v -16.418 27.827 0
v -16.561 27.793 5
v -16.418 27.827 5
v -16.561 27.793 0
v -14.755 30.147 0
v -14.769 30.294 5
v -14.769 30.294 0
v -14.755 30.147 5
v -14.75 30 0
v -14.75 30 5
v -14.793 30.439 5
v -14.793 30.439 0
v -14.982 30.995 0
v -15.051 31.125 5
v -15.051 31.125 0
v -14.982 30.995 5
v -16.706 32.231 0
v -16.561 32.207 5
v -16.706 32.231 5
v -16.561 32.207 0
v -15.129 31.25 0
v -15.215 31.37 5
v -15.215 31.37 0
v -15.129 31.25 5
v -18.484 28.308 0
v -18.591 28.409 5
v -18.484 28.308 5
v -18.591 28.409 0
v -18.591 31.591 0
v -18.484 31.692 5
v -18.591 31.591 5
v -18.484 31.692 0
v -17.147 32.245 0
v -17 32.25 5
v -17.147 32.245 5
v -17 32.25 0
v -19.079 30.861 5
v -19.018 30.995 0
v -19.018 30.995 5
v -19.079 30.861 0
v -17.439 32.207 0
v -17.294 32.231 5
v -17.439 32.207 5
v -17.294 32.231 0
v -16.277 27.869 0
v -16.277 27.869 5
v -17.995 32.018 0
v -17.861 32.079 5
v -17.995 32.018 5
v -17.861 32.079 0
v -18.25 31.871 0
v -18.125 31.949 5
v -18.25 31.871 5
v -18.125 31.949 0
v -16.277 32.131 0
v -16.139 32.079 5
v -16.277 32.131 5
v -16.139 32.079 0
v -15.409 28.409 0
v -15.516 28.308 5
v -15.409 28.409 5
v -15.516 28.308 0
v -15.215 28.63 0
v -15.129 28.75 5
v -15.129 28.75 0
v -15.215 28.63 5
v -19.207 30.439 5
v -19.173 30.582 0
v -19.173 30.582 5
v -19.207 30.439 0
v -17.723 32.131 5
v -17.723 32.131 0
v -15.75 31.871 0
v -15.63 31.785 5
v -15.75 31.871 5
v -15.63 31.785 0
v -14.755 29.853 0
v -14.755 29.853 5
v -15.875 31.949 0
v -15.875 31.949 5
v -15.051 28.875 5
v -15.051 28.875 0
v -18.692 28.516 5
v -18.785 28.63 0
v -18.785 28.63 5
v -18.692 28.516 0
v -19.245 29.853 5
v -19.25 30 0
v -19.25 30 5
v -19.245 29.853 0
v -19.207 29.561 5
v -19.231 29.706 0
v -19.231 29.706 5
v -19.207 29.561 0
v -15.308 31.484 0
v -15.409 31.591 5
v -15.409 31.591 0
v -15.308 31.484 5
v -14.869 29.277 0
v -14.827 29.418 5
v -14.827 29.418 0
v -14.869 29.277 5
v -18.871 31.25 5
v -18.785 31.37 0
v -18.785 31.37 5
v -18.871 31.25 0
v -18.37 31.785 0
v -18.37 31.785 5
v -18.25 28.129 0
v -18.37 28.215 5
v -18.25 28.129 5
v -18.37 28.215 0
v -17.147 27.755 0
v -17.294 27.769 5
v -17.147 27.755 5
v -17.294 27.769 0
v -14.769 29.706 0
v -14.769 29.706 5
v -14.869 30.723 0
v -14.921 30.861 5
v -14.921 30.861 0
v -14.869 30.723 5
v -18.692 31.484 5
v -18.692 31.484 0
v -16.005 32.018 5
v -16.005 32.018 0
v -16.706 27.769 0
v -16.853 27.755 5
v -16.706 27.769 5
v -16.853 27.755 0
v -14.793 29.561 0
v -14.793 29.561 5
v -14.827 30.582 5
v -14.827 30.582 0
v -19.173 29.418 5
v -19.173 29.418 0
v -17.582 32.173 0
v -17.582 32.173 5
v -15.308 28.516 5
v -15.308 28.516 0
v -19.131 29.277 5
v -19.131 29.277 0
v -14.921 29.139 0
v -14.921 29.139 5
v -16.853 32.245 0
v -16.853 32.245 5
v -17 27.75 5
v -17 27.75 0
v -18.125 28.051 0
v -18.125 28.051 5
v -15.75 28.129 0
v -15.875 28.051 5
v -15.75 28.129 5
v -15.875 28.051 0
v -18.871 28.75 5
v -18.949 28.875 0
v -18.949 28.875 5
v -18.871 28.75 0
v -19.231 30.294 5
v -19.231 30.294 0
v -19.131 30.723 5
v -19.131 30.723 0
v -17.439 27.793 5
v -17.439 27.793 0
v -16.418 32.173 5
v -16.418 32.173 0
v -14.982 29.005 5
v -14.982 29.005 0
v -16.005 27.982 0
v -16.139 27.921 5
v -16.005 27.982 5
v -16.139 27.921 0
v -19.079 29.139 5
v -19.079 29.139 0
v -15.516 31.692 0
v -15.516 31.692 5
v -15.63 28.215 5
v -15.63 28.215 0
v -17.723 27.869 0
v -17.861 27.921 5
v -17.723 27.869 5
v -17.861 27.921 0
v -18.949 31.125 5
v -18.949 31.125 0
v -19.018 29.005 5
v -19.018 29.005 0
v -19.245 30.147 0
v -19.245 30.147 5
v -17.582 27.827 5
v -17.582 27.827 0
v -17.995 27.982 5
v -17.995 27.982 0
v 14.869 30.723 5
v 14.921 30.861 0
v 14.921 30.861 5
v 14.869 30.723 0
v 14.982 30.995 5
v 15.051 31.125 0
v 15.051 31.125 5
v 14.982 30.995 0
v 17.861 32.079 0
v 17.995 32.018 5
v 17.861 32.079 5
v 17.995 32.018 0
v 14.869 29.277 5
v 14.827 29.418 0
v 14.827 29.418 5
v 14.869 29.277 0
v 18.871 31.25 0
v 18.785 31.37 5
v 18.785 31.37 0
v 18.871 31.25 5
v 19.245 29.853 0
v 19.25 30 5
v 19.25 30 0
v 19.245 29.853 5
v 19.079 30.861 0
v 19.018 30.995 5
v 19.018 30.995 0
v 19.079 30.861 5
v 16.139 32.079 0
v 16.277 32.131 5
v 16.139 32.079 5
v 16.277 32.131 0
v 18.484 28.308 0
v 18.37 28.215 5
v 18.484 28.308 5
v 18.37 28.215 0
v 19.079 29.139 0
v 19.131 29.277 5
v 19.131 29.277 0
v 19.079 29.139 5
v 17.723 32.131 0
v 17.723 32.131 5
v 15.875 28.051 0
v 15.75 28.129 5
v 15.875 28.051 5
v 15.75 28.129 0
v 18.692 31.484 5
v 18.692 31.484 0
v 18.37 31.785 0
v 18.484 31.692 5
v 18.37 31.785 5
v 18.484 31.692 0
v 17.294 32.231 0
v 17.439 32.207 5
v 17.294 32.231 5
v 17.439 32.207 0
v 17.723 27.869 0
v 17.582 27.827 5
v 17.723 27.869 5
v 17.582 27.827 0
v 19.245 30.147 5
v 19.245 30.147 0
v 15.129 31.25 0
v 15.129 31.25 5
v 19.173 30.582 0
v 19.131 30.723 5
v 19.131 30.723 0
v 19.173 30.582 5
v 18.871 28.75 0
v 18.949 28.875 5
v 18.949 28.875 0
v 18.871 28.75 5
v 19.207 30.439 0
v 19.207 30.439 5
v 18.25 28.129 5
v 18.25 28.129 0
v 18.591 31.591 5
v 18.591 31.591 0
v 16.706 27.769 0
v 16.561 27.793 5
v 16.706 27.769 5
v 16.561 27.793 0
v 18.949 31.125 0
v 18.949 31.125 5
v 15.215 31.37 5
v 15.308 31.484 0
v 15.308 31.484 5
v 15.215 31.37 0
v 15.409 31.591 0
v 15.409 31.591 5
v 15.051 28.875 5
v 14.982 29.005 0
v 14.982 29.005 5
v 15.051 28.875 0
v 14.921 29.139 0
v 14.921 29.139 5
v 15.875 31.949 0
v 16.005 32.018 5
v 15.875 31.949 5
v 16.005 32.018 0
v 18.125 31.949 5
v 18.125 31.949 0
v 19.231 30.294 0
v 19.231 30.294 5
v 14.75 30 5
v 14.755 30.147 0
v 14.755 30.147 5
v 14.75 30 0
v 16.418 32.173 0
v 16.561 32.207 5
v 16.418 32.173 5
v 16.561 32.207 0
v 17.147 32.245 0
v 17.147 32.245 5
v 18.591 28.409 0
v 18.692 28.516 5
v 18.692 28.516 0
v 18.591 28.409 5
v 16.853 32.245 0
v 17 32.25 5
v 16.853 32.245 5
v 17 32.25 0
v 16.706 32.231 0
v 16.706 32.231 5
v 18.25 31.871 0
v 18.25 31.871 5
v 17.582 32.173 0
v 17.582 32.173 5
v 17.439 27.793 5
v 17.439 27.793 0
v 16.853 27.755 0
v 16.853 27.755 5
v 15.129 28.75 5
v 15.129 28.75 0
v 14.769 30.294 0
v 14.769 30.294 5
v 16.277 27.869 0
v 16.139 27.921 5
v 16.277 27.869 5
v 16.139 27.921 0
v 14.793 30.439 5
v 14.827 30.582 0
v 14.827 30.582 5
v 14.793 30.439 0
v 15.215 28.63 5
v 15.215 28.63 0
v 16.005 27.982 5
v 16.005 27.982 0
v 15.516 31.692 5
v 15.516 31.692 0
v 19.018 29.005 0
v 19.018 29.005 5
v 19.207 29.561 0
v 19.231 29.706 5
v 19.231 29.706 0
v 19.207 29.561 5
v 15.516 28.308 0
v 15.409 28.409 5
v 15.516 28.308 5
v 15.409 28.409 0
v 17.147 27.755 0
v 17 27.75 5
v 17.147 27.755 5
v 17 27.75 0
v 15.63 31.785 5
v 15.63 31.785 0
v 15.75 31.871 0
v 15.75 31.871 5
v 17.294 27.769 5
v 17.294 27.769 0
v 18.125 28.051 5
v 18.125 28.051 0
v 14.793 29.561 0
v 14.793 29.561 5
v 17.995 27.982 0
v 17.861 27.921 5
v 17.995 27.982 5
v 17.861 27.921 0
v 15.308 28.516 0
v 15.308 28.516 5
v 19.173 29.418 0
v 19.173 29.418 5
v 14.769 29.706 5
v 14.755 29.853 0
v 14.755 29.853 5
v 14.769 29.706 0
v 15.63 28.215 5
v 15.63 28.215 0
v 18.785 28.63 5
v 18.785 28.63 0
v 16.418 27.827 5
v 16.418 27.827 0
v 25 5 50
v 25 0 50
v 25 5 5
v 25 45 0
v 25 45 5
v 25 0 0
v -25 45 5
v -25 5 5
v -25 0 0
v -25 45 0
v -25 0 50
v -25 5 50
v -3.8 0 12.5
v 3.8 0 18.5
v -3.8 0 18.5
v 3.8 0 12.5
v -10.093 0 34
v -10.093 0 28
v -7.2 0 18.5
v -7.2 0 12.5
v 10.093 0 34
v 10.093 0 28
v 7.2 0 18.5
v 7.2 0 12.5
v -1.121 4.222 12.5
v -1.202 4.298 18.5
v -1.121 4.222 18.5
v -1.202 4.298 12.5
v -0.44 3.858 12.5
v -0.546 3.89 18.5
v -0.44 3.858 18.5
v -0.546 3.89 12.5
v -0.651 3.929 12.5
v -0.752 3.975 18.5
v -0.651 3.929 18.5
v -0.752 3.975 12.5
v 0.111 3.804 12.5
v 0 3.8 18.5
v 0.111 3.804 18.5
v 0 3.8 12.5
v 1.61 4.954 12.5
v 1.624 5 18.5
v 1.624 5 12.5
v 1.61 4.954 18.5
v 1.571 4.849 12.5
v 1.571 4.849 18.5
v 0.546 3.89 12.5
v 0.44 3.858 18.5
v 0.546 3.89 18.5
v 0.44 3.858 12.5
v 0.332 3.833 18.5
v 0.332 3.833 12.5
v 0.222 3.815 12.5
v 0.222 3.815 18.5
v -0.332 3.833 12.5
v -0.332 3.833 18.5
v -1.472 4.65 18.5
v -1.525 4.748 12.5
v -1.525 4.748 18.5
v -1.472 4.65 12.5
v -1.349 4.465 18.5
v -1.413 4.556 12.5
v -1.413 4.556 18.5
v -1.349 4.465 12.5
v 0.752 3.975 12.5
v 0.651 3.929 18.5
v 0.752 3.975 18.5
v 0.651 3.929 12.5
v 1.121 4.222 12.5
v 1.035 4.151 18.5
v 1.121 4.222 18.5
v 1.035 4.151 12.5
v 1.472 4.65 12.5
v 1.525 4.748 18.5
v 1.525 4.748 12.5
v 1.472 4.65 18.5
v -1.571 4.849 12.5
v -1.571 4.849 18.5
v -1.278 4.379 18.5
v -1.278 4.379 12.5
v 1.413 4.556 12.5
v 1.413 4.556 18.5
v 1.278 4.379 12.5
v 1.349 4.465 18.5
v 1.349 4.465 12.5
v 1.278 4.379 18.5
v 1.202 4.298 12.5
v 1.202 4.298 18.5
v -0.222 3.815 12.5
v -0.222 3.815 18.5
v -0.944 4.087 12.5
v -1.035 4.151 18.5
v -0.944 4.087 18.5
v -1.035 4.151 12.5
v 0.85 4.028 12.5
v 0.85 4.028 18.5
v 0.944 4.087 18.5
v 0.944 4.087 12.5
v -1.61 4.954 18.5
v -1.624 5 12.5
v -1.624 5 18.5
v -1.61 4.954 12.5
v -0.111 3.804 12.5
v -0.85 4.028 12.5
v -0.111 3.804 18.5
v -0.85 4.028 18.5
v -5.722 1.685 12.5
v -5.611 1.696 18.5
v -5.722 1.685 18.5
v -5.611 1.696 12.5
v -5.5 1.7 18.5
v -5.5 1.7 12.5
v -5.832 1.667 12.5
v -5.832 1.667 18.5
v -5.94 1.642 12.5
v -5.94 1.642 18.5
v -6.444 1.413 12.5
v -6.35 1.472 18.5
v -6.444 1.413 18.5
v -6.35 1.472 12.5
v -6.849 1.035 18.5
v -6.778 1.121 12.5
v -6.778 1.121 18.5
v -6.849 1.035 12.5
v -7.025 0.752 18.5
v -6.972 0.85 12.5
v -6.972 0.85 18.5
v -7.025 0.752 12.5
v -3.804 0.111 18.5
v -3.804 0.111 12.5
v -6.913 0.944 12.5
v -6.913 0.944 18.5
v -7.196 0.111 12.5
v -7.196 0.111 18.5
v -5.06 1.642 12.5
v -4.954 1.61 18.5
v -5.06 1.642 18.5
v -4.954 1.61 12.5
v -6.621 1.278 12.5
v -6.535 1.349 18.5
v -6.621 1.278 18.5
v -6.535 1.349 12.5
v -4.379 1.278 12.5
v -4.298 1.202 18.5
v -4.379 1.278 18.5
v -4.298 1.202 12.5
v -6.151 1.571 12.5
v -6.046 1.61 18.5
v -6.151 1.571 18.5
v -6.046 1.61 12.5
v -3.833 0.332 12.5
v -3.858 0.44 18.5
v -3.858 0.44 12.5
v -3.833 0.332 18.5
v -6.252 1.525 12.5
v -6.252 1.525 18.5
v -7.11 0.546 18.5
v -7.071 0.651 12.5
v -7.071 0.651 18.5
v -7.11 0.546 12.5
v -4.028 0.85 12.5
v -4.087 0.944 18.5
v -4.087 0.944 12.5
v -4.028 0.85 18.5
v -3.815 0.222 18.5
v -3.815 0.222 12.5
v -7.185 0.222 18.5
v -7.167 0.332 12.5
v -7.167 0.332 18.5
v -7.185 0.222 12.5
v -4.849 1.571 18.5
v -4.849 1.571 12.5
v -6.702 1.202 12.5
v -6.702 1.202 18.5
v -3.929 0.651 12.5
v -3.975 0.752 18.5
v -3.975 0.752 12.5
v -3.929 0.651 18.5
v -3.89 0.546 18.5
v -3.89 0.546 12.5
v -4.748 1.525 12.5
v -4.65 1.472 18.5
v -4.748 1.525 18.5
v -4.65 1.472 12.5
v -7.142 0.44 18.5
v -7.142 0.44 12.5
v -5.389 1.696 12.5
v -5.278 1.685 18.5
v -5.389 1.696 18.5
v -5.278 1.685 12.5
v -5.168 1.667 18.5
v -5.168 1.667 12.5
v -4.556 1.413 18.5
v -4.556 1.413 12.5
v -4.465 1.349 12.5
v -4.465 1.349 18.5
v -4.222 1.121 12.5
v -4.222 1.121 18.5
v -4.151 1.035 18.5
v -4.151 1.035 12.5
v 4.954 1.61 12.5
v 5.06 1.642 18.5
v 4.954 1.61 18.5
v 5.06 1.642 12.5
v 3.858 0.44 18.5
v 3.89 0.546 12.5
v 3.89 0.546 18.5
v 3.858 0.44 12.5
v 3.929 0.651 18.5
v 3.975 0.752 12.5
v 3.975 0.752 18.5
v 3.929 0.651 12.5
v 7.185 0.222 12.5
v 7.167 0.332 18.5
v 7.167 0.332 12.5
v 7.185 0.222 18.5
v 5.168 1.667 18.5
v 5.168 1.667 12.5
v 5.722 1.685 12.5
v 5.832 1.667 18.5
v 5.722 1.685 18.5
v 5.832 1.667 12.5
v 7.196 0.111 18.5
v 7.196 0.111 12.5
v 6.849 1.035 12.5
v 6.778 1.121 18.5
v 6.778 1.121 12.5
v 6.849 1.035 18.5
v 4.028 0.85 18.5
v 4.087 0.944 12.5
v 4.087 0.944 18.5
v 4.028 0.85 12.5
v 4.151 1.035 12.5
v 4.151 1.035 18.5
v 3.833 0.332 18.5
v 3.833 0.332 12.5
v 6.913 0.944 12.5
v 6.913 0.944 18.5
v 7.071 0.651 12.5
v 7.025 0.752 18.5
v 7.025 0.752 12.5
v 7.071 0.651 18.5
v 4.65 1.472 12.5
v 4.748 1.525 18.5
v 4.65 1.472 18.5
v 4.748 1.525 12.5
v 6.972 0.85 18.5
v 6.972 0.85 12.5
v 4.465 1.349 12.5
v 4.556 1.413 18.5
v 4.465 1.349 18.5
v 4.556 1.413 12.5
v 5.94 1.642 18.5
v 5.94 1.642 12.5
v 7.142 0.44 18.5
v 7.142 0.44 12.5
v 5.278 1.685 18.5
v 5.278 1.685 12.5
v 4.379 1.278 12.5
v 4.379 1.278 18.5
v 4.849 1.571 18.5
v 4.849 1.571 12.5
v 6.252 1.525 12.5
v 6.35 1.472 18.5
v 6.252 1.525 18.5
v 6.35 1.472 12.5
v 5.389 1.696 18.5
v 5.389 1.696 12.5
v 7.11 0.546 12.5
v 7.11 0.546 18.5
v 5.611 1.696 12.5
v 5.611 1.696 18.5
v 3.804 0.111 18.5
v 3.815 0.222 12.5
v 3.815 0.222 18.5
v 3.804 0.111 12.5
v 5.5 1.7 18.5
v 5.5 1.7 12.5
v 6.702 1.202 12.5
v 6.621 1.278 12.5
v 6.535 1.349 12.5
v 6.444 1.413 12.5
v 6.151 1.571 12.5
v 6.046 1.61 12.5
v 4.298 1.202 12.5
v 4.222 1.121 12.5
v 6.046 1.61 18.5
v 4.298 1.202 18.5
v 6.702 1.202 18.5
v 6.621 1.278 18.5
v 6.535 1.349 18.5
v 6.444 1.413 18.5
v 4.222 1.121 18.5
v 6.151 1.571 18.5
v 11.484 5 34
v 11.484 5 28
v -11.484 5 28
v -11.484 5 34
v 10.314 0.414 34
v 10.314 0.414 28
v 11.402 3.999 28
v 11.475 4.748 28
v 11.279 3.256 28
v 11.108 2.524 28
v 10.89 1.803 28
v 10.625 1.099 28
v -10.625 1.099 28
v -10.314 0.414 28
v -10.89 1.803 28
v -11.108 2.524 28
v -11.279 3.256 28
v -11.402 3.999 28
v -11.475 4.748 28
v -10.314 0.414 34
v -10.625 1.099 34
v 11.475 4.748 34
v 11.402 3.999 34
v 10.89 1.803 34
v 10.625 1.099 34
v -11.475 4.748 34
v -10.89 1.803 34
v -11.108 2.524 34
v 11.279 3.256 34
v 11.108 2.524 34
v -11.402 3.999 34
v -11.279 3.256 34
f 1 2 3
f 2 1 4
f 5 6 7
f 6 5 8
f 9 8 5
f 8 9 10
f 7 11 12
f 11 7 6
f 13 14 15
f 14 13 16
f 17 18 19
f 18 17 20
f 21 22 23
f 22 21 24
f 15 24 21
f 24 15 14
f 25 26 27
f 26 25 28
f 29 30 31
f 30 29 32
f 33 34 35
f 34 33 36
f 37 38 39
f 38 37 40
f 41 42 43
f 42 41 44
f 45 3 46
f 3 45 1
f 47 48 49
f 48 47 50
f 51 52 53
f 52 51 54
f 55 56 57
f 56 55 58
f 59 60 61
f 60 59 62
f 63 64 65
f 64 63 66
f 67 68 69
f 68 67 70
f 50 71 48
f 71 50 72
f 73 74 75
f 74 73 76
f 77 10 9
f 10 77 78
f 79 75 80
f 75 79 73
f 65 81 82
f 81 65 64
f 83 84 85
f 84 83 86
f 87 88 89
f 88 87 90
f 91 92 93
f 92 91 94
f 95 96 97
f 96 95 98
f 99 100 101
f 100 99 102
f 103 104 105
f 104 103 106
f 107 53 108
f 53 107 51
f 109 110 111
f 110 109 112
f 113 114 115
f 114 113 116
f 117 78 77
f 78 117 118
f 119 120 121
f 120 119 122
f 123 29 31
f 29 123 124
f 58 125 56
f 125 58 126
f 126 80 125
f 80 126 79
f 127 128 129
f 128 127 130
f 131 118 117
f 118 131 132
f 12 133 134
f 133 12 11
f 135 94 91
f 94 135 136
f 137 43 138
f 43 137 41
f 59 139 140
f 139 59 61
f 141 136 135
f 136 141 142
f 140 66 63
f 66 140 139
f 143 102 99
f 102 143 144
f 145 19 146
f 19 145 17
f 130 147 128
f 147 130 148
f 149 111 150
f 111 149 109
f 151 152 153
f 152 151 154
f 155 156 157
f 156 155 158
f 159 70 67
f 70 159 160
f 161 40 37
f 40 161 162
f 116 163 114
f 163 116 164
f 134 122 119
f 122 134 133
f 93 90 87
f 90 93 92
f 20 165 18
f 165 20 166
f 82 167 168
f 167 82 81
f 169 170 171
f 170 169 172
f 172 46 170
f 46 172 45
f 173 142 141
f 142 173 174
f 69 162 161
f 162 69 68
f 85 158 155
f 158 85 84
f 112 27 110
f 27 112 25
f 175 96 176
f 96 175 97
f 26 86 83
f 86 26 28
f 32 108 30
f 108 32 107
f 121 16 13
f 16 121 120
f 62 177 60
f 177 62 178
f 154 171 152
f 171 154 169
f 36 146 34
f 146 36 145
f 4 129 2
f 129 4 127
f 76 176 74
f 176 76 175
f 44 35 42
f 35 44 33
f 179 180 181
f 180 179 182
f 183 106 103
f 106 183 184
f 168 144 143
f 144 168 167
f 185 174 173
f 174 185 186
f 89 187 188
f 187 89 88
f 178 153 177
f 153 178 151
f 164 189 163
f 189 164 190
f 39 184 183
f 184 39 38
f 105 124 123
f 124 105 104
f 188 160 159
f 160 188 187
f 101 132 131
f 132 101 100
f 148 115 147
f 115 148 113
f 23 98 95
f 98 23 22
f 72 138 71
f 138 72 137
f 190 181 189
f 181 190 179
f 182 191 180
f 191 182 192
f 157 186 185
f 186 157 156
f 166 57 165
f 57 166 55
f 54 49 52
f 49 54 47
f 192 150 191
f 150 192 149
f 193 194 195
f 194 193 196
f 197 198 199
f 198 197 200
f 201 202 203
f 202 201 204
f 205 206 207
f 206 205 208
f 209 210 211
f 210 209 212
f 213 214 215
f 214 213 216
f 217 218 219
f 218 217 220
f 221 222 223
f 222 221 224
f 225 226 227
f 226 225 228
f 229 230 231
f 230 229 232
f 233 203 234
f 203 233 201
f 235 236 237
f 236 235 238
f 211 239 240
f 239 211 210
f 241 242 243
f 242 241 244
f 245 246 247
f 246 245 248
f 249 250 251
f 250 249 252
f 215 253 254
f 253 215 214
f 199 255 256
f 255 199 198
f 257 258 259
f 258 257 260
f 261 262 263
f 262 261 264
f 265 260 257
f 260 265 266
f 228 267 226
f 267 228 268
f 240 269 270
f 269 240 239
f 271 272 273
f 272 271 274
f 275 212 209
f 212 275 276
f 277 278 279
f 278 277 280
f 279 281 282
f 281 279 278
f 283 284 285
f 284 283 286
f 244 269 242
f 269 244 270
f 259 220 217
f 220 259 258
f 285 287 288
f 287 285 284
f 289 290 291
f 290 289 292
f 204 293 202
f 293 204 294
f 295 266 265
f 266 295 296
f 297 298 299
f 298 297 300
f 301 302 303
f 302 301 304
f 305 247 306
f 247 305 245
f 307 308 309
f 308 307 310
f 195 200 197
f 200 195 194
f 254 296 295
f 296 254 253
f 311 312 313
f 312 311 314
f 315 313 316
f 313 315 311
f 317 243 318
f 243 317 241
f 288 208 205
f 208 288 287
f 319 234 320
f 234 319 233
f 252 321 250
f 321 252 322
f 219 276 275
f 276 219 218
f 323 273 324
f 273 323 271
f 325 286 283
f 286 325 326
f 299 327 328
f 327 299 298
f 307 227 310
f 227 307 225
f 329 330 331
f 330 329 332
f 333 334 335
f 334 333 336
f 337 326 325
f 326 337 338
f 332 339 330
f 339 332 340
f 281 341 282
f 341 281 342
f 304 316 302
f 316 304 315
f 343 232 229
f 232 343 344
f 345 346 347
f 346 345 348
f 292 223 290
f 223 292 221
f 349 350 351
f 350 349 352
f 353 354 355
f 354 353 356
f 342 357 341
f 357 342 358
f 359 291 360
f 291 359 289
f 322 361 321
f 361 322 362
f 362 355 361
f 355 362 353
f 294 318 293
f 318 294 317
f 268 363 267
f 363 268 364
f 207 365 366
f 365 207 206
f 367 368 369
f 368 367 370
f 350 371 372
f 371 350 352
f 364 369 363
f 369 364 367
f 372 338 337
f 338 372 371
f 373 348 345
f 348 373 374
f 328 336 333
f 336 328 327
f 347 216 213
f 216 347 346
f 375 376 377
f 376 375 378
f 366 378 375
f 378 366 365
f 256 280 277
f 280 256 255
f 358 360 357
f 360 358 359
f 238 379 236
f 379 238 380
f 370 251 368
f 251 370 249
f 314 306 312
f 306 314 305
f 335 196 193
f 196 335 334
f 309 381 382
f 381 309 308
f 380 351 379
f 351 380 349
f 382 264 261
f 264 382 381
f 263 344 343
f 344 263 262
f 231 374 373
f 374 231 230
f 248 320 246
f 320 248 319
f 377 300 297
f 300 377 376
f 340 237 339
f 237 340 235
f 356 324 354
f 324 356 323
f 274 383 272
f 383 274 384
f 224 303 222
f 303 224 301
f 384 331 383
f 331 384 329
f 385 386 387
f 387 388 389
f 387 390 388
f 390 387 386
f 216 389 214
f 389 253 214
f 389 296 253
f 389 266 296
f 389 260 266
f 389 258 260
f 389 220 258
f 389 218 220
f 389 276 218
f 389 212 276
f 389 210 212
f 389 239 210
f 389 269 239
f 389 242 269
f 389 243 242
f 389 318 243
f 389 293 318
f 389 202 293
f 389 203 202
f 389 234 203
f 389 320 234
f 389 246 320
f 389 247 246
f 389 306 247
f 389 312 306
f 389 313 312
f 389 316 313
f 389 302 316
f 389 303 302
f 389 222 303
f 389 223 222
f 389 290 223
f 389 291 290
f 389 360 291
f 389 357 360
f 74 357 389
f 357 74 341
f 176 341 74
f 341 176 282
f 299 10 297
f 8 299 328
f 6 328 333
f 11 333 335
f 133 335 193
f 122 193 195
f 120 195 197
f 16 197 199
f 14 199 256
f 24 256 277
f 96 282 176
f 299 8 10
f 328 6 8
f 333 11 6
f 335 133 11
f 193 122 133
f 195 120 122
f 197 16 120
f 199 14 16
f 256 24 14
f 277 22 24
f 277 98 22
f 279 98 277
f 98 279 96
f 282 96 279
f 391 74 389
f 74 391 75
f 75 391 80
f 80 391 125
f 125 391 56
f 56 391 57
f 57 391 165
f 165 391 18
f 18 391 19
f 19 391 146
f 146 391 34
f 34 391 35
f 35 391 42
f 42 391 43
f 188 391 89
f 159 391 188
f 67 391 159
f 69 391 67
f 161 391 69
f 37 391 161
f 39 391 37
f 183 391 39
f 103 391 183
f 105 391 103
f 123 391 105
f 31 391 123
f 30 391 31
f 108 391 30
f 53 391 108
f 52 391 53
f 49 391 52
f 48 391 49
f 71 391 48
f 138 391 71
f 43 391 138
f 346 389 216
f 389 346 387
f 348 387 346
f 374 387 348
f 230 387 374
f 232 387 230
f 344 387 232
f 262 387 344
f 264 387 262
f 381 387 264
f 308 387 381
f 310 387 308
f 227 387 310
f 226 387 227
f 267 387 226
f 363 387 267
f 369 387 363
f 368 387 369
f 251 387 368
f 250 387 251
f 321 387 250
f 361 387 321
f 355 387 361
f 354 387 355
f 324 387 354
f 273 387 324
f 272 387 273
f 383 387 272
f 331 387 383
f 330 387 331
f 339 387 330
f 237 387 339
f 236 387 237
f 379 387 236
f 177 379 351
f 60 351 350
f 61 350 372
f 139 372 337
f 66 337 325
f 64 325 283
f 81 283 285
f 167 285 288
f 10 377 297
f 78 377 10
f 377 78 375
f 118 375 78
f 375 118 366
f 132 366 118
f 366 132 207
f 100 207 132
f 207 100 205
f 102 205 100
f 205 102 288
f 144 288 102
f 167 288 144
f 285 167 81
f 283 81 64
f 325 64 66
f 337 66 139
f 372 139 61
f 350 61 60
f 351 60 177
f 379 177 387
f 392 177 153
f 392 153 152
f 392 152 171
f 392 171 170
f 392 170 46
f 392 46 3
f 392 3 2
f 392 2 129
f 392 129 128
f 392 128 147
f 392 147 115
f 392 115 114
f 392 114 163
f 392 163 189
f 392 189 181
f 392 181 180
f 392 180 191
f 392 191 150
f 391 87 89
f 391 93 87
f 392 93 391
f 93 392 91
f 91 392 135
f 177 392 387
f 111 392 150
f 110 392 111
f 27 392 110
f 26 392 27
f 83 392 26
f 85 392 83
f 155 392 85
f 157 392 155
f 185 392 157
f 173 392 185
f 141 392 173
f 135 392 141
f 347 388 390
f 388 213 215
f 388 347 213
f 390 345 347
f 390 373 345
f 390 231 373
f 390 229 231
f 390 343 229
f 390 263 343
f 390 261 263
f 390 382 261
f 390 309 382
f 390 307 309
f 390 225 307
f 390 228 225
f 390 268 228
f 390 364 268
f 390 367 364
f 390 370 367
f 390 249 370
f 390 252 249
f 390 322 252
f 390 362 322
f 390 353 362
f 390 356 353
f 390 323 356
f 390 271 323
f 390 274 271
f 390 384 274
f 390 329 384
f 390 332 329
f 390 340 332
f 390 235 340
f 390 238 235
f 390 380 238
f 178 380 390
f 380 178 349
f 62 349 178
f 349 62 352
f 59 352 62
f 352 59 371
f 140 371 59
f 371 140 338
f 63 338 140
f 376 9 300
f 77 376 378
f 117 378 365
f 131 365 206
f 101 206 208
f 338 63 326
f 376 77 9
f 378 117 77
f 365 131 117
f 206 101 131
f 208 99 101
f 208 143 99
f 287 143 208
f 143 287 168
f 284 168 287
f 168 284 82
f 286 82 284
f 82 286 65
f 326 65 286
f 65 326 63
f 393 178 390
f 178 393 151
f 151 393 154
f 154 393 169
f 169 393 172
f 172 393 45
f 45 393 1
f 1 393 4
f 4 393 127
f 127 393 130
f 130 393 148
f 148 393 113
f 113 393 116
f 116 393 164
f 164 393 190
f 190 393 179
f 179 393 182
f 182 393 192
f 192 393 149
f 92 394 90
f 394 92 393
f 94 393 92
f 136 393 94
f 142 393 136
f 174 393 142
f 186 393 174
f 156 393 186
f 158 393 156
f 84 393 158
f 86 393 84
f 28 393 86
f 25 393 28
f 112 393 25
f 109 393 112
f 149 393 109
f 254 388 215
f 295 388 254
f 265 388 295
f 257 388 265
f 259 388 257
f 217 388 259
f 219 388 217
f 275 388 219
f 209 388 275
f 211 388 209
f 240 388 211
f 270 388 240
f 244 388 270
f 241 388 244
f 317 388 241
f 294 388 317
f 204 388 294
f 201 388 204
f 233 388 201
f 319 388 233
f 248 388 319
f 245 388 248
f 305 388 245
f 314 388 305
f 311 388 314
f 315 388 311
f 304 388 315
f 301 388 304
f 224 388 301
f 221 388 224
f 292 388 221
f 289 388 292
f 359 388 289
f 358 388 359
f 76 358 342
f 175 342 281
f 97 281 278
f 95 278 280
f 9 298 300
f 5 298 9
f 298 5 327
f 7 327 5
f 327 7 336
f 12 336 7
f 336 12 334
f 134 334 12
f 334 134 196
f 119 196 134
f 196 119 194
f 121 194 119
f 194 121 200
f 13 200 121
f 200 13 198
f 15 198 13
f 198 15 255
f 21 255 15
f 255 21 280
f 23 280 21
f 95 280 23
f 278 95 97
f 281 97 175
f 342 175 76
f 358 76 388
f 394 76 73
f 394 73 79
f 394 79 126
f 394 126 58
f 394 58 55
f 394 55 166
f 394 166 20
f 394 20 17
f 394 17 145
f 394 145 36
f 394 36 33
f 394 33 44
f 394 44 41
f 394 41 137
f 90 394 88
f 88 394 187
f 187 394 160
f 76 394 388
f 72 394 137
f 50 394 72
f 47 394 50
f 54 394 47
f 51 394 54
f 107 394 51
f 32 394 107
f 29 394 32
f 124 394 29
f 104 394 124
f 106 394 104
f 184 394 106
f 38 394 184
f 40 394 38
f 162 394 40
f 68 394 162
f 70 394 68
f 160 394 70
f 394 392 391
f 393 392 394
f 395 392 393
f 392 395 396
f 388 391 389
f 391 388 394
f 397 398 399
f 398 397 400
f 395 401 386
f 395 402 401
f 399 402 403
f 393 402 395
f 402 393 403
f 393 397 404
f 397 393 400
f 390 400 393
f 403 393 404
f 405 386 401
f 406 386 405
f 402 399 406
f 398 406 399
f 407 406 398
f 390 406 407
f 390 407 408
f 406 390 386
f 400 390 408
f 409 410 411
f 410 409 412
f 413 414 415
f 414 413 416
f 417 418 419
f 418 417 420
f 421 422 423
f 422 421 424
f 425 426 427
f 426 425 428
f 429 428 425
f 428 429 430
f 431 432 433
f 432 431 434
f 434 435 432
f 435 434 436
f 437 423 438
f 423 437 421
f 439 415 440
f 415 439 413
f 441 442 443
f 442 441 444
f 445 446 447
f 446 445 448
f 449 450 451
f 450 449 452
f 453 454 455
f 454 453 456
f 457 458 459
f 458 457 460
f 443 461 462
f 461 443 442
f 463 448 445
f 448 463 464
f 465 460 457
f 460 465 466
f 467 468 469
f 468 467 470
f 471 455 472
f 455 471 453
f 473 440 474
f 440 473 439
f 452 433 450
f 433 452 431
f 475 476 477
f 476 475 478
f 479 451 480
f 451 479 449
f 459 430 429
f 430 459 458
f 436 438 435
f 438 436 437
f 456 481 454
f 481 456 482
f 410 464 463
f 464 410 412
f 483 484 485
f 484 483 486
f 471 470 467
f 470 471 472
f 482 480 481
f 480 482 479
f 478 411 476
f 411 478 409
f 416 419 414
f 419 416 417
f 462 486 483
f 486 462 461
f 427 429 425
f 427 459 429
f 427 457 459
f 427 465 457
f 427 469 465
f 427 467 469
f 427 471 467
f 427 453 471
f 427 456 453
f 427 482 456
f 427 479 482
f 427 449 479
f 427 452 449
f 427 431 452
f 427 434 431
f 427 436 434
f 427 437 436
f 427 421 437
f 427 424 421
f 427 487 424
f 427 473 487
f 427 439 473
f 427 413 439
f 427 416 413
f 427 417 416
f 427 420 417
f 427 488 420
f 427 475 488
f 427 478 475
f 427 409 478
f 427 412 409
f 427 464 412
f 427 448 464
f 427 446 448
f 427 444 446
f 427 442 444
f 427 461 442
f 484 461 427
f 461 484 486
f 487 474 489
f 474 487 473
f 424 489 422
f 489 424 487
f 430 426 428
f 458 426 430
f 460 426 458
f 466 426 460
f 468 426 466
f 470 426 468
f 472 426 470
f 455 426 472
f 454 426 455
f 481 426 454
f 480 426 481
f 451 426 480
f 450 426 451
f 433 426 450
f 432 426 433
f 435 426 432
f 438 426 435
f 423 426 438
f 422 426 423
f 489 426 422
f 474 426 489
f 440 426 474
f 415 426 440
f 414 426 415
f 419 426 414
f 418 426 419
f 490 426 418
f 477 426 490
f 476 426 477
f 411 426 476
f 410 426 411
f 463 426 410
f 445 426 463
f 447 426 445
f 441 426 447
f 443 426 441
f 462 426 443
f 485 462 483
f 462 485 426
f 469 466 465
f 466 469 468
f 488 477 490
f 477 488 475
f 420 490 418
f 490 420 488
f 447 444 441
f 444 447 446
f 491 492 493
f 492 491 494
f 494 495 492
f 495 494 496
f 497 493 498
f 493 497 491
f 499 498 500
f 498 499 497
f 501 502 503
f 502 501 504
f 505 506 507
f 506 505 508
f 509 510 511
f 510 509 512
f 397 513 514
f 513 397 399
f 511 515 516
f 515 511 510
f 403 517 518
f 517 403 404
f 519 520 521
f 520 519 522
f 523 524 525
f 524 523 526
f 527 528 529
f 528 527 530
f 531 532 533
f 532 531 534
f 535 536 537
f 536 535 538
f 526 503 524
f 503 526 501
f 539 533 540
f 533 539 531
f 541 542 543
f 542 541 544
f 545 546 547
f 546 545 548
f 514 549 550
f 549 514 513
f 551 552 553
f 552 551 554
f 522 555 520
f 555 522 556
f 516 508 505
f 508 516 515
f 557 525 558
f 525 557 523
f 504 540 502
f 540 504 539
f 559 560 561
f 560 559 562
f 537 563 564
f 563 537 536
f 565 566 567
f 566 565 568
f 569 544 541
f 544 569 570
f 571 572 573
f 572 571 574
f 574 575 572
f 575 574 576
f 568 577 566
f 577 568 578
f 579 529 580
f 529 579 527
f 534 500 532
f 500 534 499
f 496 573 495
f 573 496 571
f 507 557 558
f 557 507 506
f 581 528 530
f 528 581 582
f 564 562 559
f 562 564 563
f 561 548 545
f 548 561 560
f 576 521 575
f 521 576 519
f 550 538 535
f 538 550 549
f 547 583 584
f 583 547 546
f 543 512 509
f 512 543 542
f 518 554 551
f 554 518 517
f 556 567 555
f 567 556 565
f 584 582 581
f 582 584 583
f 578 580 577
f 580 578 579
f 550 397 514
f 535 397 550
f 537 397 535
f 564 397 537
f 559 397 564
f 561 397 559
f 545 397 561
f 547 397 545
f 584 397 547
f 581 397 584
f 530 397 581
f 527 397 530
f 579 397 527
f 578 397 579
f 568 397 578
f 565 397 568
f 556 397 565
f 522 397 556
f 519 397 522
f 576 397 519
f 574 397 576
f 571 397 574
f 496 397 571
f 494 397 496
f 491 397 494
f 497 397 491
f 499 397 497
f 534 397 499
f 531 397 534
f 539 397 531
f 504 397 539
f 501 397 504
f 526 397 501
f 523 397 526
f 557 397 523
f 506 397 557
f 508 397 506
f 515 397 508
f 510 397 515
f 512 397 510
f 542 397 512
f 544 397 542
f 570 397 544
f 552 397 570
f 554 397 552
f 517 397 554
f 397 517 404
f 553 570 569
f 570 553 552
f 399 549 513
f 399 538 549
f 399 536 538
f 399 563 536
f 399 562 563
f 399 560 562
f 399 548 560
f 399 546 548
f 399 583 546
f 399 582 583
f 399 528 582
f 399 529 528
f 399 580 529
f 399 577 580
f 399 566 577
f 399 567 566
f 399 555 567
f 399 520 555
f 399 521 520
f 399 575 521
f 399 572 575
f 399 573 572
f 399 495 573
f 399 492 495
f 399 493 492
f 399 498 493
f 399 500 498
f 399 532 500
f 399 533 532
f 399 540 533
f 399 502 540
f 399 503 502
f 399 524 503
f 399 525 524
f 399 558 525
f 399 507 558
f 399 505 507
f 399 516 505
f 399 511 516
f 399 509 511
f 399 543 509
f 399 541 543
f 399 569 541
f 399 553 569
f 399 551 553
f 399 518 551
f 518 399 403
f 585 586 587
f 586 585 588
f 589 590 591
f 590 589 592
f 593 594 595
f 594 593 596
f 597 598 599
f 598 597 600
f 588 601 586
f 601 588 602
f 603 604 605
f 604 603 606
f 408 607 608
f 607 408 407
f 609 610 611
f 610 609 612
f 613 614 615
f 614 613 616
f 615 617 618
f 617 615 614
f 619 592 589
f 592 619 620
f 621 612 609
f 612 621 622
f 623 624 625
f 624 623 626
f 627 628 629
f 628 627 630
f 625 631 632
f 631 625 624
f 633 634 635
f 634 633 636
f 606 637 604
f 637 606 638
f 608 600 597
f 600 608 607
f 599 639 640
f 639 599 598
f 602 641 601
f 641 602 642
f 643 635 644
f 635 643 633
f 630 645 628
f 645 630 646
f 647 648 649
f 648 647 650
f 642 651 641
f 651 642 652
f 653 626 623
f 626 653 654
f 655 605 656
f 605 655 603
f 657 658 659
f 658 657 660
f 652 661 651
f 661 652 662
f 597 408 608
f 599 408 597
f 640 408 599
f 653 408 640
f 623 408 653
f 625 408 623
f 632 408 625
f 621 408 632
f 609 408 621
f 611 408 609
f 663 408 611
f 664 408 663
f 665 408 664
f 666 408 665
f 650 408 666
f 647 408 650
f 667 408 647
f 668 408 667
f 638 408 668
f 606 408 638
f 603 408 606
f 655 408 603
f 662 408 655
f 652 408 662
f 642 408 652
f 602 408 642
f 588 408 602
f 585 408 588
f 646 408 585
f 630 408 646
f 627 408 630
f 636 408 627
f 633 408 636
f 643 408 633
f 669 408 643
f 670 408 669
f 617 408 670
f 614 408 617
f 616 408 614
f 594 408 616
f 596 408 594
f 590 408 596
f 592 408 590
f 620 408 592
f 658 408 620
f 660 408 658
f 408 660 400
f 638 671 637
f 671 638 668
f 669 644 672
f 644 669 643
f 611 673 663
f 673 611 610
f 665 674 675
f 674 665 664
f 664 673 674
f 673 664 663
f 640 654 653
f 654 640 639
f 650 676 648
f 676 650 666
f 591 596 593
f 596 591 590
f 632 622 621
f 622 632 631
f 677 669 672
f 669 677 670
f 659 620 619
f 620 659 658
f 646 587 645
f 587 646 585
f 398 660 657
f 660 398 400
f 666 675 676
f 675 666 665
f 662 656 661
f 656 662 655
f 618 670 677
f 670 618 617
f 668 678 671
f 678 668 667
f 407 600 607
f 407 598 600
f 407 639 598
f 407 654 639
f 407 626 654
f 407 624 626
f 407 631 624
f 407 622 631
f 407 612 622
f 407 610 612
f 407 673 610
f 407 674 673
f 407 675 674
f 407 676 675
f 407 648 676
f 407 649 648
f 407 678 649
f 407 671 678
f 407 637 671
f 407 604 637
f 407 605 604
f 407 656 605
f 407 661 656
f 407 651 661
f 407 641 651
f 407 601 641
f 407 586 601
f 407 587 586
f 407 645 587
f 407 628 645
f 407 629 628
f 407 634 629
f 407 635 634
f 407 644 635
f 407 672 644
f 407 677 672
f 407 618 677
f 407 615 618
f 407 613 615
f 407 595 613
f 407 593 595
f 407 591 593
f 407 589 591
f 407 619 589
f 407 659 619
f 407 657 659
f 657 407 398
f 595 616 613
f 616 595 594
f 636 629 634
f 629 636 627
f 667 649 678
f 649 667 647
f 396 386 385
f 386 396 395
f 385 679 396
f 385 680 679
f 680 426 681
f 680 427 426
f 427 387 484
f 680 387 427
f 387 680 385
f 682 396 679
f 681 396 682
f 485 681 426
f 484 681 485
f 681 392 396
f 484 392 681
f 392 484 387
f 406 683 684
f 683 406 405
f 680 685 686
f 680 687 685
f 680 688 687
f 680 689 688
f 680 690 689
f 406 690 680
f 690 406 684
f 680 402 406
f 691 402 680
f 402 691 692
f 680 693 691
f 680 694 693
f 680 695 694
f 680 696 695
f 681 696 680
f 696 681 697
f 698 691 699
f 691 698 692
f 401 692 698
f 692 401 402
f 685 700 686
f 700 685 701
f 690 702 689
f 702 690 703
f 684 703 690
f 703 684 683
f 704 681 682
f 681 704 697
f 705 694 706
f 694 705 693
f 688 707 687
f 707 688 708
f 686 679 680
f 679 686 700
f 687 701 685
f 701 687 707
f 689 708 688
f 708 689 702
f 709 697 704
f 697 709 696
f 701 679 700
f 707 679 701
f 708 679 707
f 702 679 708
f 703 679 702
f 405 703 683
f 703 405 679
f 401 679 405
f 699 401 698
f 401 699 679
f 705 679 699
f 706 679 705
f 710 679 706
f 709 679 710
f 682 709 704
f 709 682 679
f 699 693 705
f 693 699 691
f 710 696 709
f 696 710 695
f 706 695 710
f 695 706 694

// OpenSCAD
// L-shaped mounting bracket for NEMA 17 stepper motor (syringe pump)
// Print orientation: base plate on bed, motor plate builds upward (+Z)

// ---------------- Parameters ----------------
plate_t      = 5;     // base plate thickness (Z)
base_x0      = -25;   // base plate left edge (X)
base_x1      = 25;    // base plate right edge (X)
base_y0      = 0;     // base plate front edge (Y)
base_y1      = 45;    // base plate back edge (Y)

motor_h      = 50;    // motor plate height (Z)
motor_x0     = -25;   // motor plate left edge (X)
motor_x1     = 25;    // motor plate right edge (X)
motor_y0     = 0;     // motor plate front edge (Y)
motor_y1     = 5;     // motor plate back edge (Y)

boss_d       = 23;    // motor centring boss hole diameter
boss_x       = 0;     // boss hole centre X
boss_z       = 28;    // boss hole centre Z

screw_d      = 3.4;   // M3 screw holes diameter
screw_n      = 4;     // number of screw holes
screw_pitch  = 31;    // square pattern side length

gusset_t     = 5;     // gusset thickness (X)
gusset_y     = 20;    // gusset leg along +Y
gusset_z     = 20;    // gusset leg along +Z

eps          = 0.5;   // cutter overshoot past faces
$fn          = 96;    // curve resolution

// ---------------- Model ----------------
union() {
    // Base plate with M4 through-holes
    difference() {
        translate([base_x0, base_y0, 0])
            cube([base_x1 - base_x0, base_y1 - base_y0, plate_t]);
        for (sx = [-17, 17])
            translate([sx, 30, -eps])
                cylinder(d = 4.5, h = plate_t + 2 * eps);
    }

    // Motor plate with boss hole and M3 screw holes
    difference() {
        translate([motor_x0, motor_y0, 0])
            cube([motor_x1 - motor_x0, motor_y1 - motor_y0, motor_h]);
        translate([boss_x, motor_y1 + eps, boss_z])
            cylinder(d = boss_d, h = motor_y1 - motor_y0 + 2 * eps);   // along Y
        for (i = [0 : screw_n - 1])
            rotate([0, 0, i * 90])
                translate([0, motor_y1 + eps, boss_z - screw_pitch / 2])
                    cylinder(d = screw_d, h = motor_y1 - motor_y0 + 2 * eps);
    }

    // Gussets, flush with left and right edges
    for (offset = [-gusset_t, gusset_t]) {
        x0 = offset < 0 ? base_x0 + gusset_t : base_x1 - gusset_t;
        translate([x0, motor_y0 + gusset_y, motor_h - gusset_z])
            linear_extrude(height = gusset_t)
                polygon([[-gusset_y, 0], [0, gusset_y], [0, gusset_z]]); // right triangle in YZ
    }
}
